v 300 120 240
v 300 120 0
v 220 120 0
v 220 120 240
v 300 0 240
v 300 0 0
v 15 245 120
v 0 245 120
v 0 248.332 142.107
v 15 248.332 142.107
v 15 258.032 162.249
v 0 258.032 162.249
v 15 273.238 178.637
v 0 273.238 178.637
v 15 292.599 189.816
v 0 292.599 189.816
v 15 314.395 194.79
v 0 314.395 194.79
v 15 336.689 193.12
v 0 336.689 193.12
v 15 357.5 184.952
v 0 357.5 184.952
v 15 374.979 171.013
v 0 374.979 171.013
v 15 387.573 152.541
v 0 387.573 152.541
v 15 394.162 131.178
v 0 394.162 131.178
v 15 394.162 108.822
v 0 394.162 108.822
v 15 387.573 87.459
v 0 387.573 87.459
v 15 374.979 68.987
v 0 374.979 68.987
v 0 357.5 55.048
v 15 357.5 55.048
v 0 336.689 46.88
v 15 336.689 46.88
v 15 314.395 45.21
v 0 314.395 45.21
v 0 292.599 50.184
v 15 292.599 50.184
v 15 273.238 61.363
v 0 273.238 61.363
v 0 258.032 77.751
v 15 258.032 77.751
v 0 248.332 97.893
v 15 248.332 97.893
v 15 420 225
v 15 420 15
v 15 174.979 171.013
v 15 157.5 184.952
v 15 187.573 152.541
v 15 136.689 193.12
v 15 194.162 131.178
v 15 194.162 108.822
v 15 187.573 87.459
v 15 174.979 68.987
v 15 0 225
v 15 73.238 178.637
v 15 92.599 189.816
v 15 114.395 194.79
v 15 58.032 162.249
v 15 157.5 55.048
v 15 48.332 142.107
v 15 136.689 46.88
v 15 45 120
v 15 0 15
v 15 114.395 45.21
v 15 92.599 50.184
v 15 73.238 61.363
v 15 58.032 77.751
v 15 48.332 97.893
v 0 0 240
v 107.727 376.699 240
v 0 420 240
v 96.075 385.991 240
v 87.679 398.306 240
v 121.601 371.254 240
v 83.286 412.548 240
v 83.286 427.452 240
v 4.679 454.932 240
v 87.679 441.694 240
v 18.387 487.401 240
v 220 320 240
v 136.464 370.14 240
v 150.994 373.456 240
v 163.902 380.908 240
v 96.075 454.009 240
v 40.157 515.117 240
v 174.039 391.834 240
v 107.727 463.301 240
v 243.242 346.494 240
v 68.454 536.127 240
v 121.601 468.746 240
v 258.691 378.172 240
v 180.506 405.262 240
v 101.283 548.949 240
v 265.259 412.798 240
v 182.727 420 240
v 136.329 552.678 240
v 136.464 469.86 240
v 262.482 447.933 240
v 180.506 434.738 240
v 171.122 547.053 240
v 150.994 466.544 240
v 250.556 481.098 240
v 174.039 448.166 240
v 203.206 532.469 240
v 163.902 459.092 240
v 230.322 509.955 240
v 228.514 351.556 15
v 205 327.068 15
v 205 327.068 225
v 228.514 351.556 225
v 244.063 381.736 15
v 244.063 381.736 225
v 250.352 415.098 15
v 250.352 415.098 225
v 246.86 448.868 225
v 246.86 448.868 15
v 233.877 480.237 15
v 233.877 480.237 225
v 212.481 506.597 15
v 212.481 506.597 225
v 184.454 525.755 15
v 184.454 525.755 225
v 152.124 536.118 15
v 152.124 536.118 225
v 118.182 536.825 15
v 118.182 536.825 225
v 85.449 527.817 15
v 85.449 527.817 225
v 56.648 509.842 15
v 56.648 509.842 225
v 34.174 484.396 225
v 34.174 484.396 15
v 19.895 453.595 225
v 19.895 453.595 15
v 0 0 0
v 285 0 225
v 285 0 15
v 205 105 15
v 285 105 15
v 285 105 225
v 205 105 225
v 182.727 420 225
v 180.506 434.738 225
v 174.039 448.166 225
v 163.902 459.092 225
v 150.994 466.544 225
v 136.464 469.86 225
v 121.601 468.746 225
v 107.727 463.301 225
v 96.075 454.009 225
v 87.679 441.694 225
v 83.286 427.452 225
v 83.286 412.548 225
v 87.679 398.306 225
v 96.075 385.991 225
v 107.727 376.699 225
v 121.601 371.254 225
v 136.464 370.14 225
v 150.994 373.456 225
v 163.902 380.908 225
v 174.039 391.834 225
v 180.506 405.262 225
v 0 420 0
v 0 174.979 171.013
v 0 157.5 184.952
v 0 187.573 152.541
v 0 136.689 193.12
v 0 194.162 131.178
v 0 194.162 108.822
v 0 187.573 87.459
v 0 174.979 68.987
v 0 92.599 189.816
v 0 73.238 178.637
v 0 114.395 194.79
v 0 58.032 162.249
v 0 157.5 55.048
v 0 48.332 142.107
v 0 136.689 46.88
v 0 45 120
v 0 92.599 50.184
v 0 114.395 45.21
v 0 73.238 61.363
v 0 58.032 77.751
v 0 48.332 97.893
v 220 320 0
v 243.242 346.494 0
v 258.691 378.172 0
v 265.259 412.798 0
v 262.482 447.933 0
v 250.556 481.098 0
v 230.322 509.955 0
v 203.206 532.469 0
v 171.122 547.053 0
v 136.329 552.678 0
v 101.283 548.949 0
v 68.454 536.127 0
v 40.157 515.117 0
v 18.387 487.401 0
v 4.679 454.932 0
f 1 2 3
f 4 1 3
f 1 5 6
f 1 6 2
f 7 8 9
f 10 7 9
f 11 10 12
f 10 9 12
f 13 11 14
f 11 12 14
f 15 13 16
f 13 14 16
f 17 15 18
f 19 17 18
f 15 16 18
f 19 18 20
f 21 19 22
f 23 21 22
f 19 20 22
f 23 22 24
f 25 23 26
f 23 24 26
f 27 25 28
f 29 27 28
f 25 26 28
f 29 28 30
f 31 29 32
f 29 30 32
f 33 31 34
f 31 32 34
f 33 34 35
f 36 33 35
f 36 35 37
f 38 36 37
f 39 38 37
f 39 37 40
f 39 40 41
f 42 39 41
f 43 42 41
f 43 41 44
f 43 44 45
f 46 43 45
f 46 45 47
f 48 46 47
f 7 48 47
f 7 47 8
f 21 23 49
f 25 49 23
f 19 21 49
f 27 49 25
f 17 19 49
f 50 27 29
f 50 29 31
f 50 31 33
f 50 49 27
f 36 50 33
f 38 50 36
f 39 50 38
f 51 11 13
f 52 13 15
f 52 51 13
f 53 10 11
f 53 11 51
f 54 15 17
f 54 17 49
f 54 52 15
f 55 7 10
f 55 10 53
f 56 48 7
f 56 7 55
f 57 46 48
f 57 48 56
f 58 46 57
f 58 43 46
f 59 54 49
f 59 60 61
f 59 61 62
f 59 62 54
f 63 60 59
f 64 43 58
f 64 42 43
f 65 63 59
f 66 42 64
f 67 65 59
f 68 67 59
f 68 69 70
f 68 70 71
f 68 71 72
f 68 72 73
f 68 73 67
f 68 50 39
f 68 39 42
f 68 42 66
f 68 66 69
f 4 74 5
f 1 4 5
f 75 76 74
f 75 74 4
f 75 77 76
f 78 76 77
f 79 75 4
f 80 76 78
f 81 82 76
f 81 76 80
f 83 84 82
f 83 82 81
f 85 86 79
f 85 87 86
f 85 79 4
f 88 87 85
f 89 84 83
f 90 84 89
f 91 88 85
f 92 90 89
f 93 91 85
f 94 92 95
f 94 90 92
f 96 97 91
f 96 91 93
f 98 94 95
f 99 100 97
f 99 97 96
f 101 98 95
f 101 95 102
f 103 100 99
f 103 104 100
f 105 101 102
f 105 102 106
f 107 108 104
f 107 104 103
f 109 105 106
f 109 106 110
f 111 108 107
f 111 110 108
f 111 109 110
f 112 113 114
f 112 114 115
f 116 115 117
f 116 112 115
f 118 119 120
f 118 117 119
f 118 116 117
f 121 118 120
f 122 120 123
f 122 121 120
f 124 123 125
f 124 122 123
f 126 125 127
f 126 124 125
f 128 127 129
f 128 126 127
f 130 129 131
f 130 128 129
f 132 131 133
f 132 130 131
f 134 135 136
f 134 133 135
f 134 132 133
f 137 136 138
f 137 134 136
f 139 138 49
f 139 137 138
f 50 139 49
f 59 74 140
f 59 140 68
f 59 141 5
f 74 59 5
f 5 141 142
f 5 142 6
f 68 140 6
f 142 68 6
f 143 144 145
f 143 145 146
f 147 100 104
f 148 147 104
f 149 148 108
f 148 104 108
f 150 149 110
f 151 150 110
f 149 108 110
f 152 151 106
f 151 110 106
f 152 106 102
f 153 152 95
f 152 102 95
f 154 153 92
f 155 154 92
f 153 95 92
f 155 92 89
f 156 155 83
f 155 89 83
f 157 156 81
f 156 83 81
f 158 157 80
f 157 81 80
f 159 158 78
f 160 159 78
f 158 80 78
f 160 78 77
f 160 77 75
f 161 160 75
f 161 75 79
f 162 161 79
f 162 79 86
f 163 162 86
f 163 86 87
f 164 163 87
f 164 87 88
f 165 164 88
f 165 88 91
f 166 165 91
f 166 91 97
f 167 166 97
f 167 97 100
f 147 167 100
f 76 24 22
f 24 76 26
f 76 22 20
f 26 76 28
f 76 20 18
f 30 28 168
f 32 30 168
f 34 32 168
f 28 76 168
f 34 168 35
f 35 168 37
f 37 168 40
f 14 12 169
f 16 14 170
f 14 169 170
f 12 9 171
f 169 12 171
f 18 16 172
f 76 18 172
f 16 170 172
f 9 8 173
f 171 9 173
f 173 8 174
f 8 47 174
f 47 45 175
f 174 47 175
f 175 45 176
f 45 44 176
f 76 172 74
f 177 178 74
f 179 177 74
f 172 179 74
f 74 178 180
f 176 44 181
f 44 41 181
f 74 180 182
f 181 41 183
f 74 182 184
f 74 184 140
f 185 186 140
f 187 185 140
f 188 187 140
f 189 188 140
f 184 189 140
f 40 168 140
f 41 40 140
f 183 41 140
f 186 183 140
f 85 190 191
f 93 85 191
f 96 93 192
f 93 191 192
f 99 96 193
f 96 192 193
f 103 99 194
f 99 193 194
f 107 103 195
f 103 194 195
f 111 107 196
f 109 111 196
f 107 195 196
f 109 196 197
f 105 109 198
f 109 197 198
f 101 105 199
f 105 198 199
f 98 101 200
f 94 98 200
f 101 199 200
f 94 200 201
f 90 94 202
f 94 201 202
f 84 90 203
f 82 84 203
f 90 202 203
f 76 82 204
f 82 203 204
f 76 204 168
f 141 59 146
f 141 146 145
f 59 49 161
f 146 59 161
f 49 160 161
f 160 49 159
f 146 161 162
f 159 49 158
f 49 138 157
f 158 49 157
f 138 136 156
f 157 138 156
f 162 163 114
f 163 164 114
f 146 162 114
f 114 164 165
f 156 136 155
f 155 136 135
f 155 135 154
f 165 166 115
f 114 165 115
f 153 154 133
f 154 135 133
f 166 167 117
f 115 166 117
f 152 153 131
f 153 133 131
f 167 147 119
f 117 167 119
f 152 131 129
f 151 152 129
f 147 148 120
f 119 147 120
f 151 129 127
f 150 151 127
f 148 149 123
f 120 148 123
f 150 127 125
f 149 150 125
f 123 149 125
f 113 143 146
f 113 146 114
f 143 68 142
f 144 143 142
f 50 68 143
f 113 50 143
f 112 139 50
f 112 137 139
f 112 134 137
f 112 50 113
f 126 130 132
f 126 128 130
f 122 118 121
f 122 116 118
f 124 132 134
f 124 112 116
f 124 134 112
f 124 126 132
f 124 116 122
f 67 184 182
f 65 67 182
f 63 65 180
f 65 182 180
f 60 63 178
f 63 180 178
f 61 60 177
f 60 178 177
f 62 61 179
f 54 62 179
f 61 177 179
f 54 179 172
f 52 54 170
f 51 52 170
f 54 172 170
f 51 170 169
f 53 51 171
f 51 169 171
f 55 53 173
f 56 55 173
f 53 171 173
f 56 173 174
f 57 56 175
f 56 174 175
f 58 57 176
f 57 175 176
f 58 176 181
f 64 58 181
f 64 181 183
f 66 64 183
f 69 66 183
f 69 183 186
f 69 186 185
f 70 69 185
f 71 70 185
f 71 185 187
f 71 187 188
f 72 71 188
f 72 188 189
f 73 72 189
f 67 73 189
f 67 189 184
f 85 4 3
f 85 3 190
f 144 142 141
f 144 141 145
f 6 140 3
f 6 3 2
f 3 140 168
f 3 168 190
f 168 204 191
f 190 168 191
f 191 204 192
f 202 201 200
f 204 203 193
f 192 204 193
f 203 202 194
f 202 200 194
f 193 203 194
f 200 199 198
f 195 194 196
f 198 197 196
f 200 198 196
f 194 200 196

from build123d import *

# Parameters (mm, degrees)
F1_DEPTH = 240
F2_T     = -15
F3_R     = 50
F4_DEPTH = 50
F5_R     = 75
F6_DEPTH = 50


with BuildPart() as f1:
    # F0 (on Top) → F1 (new body)
    with BuildSketch(Plane.XY):
        with BuildLine():
            Line((0, 420), (0, 0))
            Line((0, 0), (300, 0))
            Line((300, 0), (300, 120))
            Line((300, 120), (220, 120))
            Line((220, 120), (220, 320))
            ThreePointArc((220, 320), (187.6502089709, 540.8304597359), (0, 420))
        make_face()
    extrude(amount=F1_DEPTH)

    # F2
    f2_openings = [f1.faces().sort_by_distance(p)[0] for p in [
        (150, 0, 120),
    ]]
    offset(amount=F2_T, openings=f2_openings, kind=Kind.INTERSECTION)

    # F3 (on face) → F4 (cut)
    with BuildSketch(Plane.XY.offset(240)):
        with Locations((132.7272727273, 420)):
            Circle(F3_R)
    extrude(amount=-F4_DEPTH, mode=Mode.SUBTRACT)

    # F5 (on face) → F6 (cut)
    with BuildSketch(Plane(origin=(0, 0, 0), x_dir=(0, -1, 0), z_dir=(-1, 0, 0))):
        with Locations((-320, 120)):
            Circle(F5_R)
        with Locations((-120, 120)):
            Circle(F5_R)
    extrude(amount=-F6_DEPTH, mode=Mode.SUBTRACT)


solid = f1.part
